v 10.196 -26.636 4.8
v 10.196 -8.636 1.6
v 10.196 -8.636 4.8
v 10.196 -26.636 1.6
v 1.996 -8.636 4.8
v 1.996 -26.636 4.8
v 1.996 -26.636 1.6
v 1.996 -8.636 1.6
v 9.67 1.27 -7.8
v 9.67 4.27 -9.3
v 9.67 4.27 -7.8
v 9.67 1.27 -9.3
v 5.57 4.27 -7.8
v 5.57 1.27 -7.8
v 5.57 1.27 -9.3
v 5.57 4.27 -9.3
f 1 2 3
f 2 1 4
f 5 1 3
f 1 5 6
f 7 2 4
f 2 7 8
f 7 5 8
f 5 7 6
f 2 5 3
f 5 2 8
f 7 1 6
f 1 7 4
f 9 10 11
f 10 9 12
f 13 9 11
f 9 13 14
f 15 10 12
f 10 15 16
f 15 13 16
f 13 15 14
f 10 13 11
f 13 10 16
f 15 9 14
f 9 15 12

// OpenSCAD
// file: 801f8c8ad5252d830007bc8fb8f76d3168990c0b1102200be74383be07b724a8.scad
/*
   Copyright 2018 Scott Bezek and the splitflap contributors

   Licensed under the Apache License, Version 2.0 (the "License");
   you may not use this file except in compliance with the License.
   You may obtain a copy of the License at

       http://www.apache.org/licenses/LICENSE-2.0

   Unless required by applicable law or agreed to in writing, software
   distributed under the License is distributed on an "AS IS" BASIS,
   WITHOUT WARRANTIES OR CONDITIONS OF ANY KIND, either express or implied.
   See the License for the specific language governing permissions and
   limitations under the License.
*/

include <3a8aa1ee2c5f15af7c9a4d3d95d6786cd3b11c8e1af2661494beaac4b8dd79fa.scad>;

pcb_thickness = 1.6;
sensor_spool_distance = 0.70;  // distance from the sensor to the face of the spool

// From datasheet:
hall_effect_height = (2.8 + 3.2) / 2;
hall_effect_width = (3.9 + 4.3) / 2;
hall_effect_thickness = (1.40 + 1.60) / 2;
hall_effect_sensor_offset_y = hall_effect_height - 1.25;
hall_effect_pin_length_max = 14.5;

// From sensor.kicad_pcb:
pcb_height = 16.256;
pcb_length = 16.256;
pcb_hole_to_sensor_pin_1_x = 10.16;
pcb_hole_to_sensor_pin_1_y = 1.27;
sensor_pin_pitch = 2.54;
pcb_hole_to_connector_pin_1_x = 8.636;
pcb_hole_to_connector_pin_1_y = 8.636;
connector_pin_pitch = 2.54;
pcb_edge_to_hole_x = 4.572;
pcb_edge_to_hole_y = 4.572;

pcb_adjustment_range = 4;
pcb_hole_radius = m4_hole_diameter/2;

// Jig dimensions
pcb_jig_corner_fillet = 2;
pcb_jig_align_thickness = 2;
pcb_jig_align_length = 0;  // past the PCB thickness
pcb_jig_align_clearance = 0.25;  // on x, around the PCB
pcb_jig_depth_clearance = 0.1;  // on y, from sensor to jig


// Computed dimensions
pcb_hole_to_sensor_x = pcb_hole_to_sensor_pin_1_x - sensor_pin_pitch;
pcb_hole_to_sensor_y = pcb_hole_to_sensor_pin_1_y + hall_effect_sensor_offset_y;


// Rough numbers for 3d rendering only (non-critical dimensions)
pcb_connector_height = 3.2;
pcb_connector_width = 8.2;
pcb_connector_length = 18;
pcb_connector_pin_width = 0.64;
pcb_connector_pin_slop = 0.4;
pcb_connector_pin_tail_length = 3.05 + 2.5/2;

pcb_sensor_pin_width = 0.43;

        module color_selector(c) {
            precision = 0.0000001;  // arbitrary
            function compare_floats(x, y, i=0) = 
                  (len(x) != len(y)) ? false  // if arrays differ in length, they can't be equal
                : (i >= len(x)) ? true  // if we've hit the end of the arrays without issue, we're equal
                : (x[i] - precision <= y[i]) && x[i] + precision >= y[i]
                    ? compare_floats(x, y, i+1)
                    : false;  // not equal, short circuit

            if (c == [0, 0, 0] || compare_floats(c, [0, 0, 0]))
                children();
        }
                    
// file: 3a8aa1ee2c5f15af7c9a4d3d95d6786cd3b11c8e1af2661494beaac4b8dd79fa.scad
/*
   Copyright 2015-2018 Scott Bezek and the splitflap contributors

   Licensed under the Apache License, Version 2.0 (the "License");
   you may not use this file except in compliance with the License.
   You may obtain a copy of the License at

       http://www.apache.org/licenses/LICENSE-2.0

   Unless required by applicable law or agreed to in writing, software
   distributed under the License is distributed on an "AS IS" BASIS,
   WITHOUT WARRANTIES OR CONDITIONS OF ANY KIND, either express or implied.
   See the License for the specific language governing permissions and
   limitations under the License.
*/

// M4 bolts
m4_hole_diameter = 4.5;
m4_bolt_length = 10;
m4_button_head_diameter = 7.6 + .2;
m4_button_head_length = 2.2 + .2;
m4_nut_width_flats = 7 + .2;
m4_nut_width_corners = 7/cos(180/6);
m4_nut_width_corners_padded = m4_nut_width_corners + .2;
m4_nut_length = 3.2;
m4_nut_length_padded = m4_nut_length + .2;


        module color_selector(c) {
            precision = 0.0000001;  // arbitrary
            function compare_floats(x, y, i=0) = 
                  (len(x) != len(y)) ? false  // if arrays differ in length, they can't be equal
                : (i >= len(x)) ? true  // if we've hit the end of the arrays without issue, we're equal
                : (x[i] - precision <= y[i]) && x[i] + precision >= y[i]
                    ? compare_floats(x, y, i+1)
                    : false;  // not equal, short circuit

            if (c == [0, 0, 0] || compare_floats(c, [0, 0, 0]))
                children();
        }
                    
// main file
/*
   Copyright 2015-2018 Scott Bezek and the splitflap contributors

   Licensed under the Apache License, Version 2.0 (the "License");
   you may not use this file except in compliance with the License.
   You may obtain a copy of the License at

       http://www.apache.org/licenses/LICENSE-2.0

   Unless required by applicable law or agreed to in writing, software
   distributed under the License is distributed on an "AS IS" BASIS,
   WITHOUT WARRANTIES OR CONDITIONS OF ANY KIND, either express or implied.
   See the License for the specific language governing permissions and
   limitations under the License.
*/
include <3a8aa1ee2c5f15af7c9a4d3d95d6786cd3b11c8e1af2661494beaac4b8dd79fa.scad>;
include <801f8c8ad5252d830007bc8fb8f76d3168990c0b1102200be74383be07b724a8.scad>;


module pcb_outline_2d(hole=true) {
    difference() {
        translate([-pcb_edge_to_hole_x, -pcb_height + pcb_edge_to_hole_y]) {
            square([pcb_length, pcb_height]);
        }
        if(hole) {
            circle(r=m4_hole_diameter/2, $fn=30);
        }
    }
}

// 3D PCB module, origin at the center of the mounting hole on the bottom surface of the PCB
module pcb(pcb_to_spool, render_jig=false, jig_thickness=0) {
     color_selector([0, 0.5, 0]) {
        linear_extrude(height=pcb_thickness) {
            pcb_outline_2d();
        }
    }

    // Connector
     color_selector([0, 0, 0]) {
        translate([pcb_hole_to_connector_pin_1_x - connector_pin_pitch - pcb_connector_width/2, -pcb_hole_to_connector_pin_1_y - pcb_connector_length, pcb_thickness]) {
            cube([pcb_connector_width, pcb_connector_length, pcb_connector_height]);
        }
    }

    // Connector pins
     color_selector([0.5, 0.5, 0.5]) {
        translate([pcb_hole_to_connector_pin_1_x - pcb_connector_pin_width/2, -pcb_hole_to_connector_pin_1_y - pcb_connector_pin_width/2, -pcb_connector_pin_tail_length + pcb_thickness + 2.5/2]) {
            cube([pcb_connector_pin_width, pcb_connector_pin_width, pcb_connector_pin_tail_length]);
            translate([-connector_pin_pitch, 0, 0]) {
                cube([pcb_connector_pin_width, pcb_connector_pin_width, pcb_connector_pin_tail_length]);
            }
            translate([-connector_pin_pitch * 2, 0, 0]) {
                cube([pcb_connector_pin_width, pcb_connector_pin_width, pcb_connector_pin_tail_length]);
            }
        }
    }

    // Sensor pins
     color_selector([0.5, 0.5, 0.5]) {
        pin_extra_length = 0.1;  // pins excess sticking out from the back of the PCB
        sensor_z_offset = pcb_to_spool - sensor_spool_distance - hall_effect_thickness/2 - 0.1;
        sensor_pin_length = sensor_z_offset + pcb_thickness + pin_extra_length;
        assert(sensor_pin_length < hall_effect_pin_length_max, "Warning: design is too thick to fit sensor");

        translate([pcb_hole_to_sensor_pin_1_x - pcb_sensor_pin_width/2, pcb_hole_to_sensor_pin_1_y - pcb_sensor_pin_width/2, -sensor_z_offset]) {
            cube([pcb_sensor_pin_width, pcb_sensor_pin_width, sensor_pin_length]);
            translate([-sensor_pin_pitch, 0, 0]) {
                cube([pcb_sensor_pin_width, pcb_sensor_pin_width, sensor_pin_length]);
            }
            translate([-sensor_pin_pitch * 2, 0, 0]) {
                cube([pcb_sensor_pin_width, pcb_sensor_pin_width, sensor_pin_length]);
            }
        }
    }

    // Sensor body
     color_selector([0, 0, 0]) {
        translate([pcb_hole_to_sensor_pin_1_x - sensor_pin_pitch - hall_effect_width/2, pcb_hole_to_sensor_pin_1_y, -pcb_to_spool + sensor_spool_distance]) {
            cube([hall_effect_width, hall_effect_height, hall_effect_thickness]);
        }
    }

    // Jig
    if(render_jig) {
         color_selector([1, 1, 0])
        translate([-pcb_edge_to_hole_x - pcb_jig_align_thickness - pcb_jig_align_clearance, pcb_hole_to_sensor_pin_1_y + pcb_sensor_pin_width/2 + thickness, -pcb_to_sensor(pcb_to_spool) + pcb_jig_depth_clearance])
        rotate([90, 0, 0])
            sensor_jig(pcb_to_spool, jig_thickness);
    }
}

// 2D cutouts needed to mount the PCB module, origin at the center of the mounting hole
module pcb_cutouts(adjustment_range=pcb_adjustment_range) {
    hull_slide(delta=adjustment_range) {
        // Bolt slot
        hull() {
            circle(r=m4_hole_diameter/2, $fn=30);
            translate([pcb_hole_to_sensor_pin_1_x + sensor_pin_pitch - m4_hole_diameter/2, 0, 0])
                circle(r=m4_hole_diameter/2, $fn=30);
        }
        // Pin header slot
        translate([pcb_hole_to_connector_pin_1_x - connector_pin_pitch, -pcb_hole_to_connector_pin_1_y]) {
            hull() {
                pin_slot_height = pcb_connector_pin_width + pcb_connector_pin_slop;
                pin_slot_width = connector_pin_pitch * 4 - pin_slot_height;
                translate([pin_slot_width/2, 0, 0])
                    circle(pin_slot_height/2, $fn=15);
                translate([-pin_slot_width/2, 0, 0])
                    circle(pin_slot_height/2, $fn=15);
            }
        }
    }
}

module hull_slide(delta) {
    for (i = [0:$children - 1]) {
        hull() {
            translate([-delta, 0]) {
                children(i);
            }
            translate([delta, 0]) {
                children(i);
            }
        }
    }
}

function pcb_to_sensor(pcb_to_spool) = pcb_to_spool - sensor_spool_distance - hall_effect_thickness;  // using sensor rear face
function pcb_hole_to_sensor_x() = pcb_hole_to_sensor_x;
function pcb_hole_to_sensor_y() = pcb_hole_to_sensor_y;
function pcb_thickness() = pcb_thickness;
function sensor_jig_height(pcb_to_spool) = pcb_to_sensor(pcb_to_spool) - pcb_jig_depth_clearance + pcb_jig_align_length + pcb_thickness;
function sensor_jig_width(pcb_to_spool) = pcb_length + (pcb_jig_align_thickness + pcb_jig_align_clearance) * 2;

module sensor_jig(pcb_to_spool, thickness) {
    module fillet() {
        eps = 0.01;
        difference() {
            translate([-eps, -eps, 0])
                square(pcb_jig_corner_fillet + eps);
            translate([pcb_jig_corner_fillet, pcb_jig_corner_fillet, 0])
                circle(r=pcb_jig_corner_fillet, $fn=20);
        }
    }

    linear_extrude(thickness) {
        difference() {
        union() {
            square([sensor_jig_width(pcb_to_spool), pcb_to_sensor(pcb_to_spool) - pcb_jig_depth_clearance]);  // main body
            square([pcb_jig_align_thickness, sensor_jig_height(pcb_to_spool)]);  // alignment edge, left
            translate([sensor_jig_width(pcb_to_spool) - pcb_jig_align_thickness, 0])
            square([pcb_jig_align_thickness, sensor_jig_height(pcb_to_spool)]);  // alignment edge, right
        }
        fillet();
        mirror([1, 0, 0])
            translate([-sensor_jig_width(pcb_to_spool), 0, 0])
                fillet();
        }
    }
}

// Example usage:
pcb(10);

        module color_selector(c) {
            precision = 0.0000001;  // arbitrary
            function compare_floats(x, y, i=0) = 
                  (len(x) != len(y)) ? false  // if arrays differ in length, they can't be equal
                : (i >= len(x)) ? true  // if we've hit the end of the arrays without issue, we're equal
                : (x[i] - precision <= y[i]) && x[i] + precision >= y[i]
                    ? compare_floats(x, y, i+1)
                    : false;  // not equal, short circuit

            if (c == [0, 0, 0] || compare_floats(c, [0, 0, 0]))
                children();
        }
                    
